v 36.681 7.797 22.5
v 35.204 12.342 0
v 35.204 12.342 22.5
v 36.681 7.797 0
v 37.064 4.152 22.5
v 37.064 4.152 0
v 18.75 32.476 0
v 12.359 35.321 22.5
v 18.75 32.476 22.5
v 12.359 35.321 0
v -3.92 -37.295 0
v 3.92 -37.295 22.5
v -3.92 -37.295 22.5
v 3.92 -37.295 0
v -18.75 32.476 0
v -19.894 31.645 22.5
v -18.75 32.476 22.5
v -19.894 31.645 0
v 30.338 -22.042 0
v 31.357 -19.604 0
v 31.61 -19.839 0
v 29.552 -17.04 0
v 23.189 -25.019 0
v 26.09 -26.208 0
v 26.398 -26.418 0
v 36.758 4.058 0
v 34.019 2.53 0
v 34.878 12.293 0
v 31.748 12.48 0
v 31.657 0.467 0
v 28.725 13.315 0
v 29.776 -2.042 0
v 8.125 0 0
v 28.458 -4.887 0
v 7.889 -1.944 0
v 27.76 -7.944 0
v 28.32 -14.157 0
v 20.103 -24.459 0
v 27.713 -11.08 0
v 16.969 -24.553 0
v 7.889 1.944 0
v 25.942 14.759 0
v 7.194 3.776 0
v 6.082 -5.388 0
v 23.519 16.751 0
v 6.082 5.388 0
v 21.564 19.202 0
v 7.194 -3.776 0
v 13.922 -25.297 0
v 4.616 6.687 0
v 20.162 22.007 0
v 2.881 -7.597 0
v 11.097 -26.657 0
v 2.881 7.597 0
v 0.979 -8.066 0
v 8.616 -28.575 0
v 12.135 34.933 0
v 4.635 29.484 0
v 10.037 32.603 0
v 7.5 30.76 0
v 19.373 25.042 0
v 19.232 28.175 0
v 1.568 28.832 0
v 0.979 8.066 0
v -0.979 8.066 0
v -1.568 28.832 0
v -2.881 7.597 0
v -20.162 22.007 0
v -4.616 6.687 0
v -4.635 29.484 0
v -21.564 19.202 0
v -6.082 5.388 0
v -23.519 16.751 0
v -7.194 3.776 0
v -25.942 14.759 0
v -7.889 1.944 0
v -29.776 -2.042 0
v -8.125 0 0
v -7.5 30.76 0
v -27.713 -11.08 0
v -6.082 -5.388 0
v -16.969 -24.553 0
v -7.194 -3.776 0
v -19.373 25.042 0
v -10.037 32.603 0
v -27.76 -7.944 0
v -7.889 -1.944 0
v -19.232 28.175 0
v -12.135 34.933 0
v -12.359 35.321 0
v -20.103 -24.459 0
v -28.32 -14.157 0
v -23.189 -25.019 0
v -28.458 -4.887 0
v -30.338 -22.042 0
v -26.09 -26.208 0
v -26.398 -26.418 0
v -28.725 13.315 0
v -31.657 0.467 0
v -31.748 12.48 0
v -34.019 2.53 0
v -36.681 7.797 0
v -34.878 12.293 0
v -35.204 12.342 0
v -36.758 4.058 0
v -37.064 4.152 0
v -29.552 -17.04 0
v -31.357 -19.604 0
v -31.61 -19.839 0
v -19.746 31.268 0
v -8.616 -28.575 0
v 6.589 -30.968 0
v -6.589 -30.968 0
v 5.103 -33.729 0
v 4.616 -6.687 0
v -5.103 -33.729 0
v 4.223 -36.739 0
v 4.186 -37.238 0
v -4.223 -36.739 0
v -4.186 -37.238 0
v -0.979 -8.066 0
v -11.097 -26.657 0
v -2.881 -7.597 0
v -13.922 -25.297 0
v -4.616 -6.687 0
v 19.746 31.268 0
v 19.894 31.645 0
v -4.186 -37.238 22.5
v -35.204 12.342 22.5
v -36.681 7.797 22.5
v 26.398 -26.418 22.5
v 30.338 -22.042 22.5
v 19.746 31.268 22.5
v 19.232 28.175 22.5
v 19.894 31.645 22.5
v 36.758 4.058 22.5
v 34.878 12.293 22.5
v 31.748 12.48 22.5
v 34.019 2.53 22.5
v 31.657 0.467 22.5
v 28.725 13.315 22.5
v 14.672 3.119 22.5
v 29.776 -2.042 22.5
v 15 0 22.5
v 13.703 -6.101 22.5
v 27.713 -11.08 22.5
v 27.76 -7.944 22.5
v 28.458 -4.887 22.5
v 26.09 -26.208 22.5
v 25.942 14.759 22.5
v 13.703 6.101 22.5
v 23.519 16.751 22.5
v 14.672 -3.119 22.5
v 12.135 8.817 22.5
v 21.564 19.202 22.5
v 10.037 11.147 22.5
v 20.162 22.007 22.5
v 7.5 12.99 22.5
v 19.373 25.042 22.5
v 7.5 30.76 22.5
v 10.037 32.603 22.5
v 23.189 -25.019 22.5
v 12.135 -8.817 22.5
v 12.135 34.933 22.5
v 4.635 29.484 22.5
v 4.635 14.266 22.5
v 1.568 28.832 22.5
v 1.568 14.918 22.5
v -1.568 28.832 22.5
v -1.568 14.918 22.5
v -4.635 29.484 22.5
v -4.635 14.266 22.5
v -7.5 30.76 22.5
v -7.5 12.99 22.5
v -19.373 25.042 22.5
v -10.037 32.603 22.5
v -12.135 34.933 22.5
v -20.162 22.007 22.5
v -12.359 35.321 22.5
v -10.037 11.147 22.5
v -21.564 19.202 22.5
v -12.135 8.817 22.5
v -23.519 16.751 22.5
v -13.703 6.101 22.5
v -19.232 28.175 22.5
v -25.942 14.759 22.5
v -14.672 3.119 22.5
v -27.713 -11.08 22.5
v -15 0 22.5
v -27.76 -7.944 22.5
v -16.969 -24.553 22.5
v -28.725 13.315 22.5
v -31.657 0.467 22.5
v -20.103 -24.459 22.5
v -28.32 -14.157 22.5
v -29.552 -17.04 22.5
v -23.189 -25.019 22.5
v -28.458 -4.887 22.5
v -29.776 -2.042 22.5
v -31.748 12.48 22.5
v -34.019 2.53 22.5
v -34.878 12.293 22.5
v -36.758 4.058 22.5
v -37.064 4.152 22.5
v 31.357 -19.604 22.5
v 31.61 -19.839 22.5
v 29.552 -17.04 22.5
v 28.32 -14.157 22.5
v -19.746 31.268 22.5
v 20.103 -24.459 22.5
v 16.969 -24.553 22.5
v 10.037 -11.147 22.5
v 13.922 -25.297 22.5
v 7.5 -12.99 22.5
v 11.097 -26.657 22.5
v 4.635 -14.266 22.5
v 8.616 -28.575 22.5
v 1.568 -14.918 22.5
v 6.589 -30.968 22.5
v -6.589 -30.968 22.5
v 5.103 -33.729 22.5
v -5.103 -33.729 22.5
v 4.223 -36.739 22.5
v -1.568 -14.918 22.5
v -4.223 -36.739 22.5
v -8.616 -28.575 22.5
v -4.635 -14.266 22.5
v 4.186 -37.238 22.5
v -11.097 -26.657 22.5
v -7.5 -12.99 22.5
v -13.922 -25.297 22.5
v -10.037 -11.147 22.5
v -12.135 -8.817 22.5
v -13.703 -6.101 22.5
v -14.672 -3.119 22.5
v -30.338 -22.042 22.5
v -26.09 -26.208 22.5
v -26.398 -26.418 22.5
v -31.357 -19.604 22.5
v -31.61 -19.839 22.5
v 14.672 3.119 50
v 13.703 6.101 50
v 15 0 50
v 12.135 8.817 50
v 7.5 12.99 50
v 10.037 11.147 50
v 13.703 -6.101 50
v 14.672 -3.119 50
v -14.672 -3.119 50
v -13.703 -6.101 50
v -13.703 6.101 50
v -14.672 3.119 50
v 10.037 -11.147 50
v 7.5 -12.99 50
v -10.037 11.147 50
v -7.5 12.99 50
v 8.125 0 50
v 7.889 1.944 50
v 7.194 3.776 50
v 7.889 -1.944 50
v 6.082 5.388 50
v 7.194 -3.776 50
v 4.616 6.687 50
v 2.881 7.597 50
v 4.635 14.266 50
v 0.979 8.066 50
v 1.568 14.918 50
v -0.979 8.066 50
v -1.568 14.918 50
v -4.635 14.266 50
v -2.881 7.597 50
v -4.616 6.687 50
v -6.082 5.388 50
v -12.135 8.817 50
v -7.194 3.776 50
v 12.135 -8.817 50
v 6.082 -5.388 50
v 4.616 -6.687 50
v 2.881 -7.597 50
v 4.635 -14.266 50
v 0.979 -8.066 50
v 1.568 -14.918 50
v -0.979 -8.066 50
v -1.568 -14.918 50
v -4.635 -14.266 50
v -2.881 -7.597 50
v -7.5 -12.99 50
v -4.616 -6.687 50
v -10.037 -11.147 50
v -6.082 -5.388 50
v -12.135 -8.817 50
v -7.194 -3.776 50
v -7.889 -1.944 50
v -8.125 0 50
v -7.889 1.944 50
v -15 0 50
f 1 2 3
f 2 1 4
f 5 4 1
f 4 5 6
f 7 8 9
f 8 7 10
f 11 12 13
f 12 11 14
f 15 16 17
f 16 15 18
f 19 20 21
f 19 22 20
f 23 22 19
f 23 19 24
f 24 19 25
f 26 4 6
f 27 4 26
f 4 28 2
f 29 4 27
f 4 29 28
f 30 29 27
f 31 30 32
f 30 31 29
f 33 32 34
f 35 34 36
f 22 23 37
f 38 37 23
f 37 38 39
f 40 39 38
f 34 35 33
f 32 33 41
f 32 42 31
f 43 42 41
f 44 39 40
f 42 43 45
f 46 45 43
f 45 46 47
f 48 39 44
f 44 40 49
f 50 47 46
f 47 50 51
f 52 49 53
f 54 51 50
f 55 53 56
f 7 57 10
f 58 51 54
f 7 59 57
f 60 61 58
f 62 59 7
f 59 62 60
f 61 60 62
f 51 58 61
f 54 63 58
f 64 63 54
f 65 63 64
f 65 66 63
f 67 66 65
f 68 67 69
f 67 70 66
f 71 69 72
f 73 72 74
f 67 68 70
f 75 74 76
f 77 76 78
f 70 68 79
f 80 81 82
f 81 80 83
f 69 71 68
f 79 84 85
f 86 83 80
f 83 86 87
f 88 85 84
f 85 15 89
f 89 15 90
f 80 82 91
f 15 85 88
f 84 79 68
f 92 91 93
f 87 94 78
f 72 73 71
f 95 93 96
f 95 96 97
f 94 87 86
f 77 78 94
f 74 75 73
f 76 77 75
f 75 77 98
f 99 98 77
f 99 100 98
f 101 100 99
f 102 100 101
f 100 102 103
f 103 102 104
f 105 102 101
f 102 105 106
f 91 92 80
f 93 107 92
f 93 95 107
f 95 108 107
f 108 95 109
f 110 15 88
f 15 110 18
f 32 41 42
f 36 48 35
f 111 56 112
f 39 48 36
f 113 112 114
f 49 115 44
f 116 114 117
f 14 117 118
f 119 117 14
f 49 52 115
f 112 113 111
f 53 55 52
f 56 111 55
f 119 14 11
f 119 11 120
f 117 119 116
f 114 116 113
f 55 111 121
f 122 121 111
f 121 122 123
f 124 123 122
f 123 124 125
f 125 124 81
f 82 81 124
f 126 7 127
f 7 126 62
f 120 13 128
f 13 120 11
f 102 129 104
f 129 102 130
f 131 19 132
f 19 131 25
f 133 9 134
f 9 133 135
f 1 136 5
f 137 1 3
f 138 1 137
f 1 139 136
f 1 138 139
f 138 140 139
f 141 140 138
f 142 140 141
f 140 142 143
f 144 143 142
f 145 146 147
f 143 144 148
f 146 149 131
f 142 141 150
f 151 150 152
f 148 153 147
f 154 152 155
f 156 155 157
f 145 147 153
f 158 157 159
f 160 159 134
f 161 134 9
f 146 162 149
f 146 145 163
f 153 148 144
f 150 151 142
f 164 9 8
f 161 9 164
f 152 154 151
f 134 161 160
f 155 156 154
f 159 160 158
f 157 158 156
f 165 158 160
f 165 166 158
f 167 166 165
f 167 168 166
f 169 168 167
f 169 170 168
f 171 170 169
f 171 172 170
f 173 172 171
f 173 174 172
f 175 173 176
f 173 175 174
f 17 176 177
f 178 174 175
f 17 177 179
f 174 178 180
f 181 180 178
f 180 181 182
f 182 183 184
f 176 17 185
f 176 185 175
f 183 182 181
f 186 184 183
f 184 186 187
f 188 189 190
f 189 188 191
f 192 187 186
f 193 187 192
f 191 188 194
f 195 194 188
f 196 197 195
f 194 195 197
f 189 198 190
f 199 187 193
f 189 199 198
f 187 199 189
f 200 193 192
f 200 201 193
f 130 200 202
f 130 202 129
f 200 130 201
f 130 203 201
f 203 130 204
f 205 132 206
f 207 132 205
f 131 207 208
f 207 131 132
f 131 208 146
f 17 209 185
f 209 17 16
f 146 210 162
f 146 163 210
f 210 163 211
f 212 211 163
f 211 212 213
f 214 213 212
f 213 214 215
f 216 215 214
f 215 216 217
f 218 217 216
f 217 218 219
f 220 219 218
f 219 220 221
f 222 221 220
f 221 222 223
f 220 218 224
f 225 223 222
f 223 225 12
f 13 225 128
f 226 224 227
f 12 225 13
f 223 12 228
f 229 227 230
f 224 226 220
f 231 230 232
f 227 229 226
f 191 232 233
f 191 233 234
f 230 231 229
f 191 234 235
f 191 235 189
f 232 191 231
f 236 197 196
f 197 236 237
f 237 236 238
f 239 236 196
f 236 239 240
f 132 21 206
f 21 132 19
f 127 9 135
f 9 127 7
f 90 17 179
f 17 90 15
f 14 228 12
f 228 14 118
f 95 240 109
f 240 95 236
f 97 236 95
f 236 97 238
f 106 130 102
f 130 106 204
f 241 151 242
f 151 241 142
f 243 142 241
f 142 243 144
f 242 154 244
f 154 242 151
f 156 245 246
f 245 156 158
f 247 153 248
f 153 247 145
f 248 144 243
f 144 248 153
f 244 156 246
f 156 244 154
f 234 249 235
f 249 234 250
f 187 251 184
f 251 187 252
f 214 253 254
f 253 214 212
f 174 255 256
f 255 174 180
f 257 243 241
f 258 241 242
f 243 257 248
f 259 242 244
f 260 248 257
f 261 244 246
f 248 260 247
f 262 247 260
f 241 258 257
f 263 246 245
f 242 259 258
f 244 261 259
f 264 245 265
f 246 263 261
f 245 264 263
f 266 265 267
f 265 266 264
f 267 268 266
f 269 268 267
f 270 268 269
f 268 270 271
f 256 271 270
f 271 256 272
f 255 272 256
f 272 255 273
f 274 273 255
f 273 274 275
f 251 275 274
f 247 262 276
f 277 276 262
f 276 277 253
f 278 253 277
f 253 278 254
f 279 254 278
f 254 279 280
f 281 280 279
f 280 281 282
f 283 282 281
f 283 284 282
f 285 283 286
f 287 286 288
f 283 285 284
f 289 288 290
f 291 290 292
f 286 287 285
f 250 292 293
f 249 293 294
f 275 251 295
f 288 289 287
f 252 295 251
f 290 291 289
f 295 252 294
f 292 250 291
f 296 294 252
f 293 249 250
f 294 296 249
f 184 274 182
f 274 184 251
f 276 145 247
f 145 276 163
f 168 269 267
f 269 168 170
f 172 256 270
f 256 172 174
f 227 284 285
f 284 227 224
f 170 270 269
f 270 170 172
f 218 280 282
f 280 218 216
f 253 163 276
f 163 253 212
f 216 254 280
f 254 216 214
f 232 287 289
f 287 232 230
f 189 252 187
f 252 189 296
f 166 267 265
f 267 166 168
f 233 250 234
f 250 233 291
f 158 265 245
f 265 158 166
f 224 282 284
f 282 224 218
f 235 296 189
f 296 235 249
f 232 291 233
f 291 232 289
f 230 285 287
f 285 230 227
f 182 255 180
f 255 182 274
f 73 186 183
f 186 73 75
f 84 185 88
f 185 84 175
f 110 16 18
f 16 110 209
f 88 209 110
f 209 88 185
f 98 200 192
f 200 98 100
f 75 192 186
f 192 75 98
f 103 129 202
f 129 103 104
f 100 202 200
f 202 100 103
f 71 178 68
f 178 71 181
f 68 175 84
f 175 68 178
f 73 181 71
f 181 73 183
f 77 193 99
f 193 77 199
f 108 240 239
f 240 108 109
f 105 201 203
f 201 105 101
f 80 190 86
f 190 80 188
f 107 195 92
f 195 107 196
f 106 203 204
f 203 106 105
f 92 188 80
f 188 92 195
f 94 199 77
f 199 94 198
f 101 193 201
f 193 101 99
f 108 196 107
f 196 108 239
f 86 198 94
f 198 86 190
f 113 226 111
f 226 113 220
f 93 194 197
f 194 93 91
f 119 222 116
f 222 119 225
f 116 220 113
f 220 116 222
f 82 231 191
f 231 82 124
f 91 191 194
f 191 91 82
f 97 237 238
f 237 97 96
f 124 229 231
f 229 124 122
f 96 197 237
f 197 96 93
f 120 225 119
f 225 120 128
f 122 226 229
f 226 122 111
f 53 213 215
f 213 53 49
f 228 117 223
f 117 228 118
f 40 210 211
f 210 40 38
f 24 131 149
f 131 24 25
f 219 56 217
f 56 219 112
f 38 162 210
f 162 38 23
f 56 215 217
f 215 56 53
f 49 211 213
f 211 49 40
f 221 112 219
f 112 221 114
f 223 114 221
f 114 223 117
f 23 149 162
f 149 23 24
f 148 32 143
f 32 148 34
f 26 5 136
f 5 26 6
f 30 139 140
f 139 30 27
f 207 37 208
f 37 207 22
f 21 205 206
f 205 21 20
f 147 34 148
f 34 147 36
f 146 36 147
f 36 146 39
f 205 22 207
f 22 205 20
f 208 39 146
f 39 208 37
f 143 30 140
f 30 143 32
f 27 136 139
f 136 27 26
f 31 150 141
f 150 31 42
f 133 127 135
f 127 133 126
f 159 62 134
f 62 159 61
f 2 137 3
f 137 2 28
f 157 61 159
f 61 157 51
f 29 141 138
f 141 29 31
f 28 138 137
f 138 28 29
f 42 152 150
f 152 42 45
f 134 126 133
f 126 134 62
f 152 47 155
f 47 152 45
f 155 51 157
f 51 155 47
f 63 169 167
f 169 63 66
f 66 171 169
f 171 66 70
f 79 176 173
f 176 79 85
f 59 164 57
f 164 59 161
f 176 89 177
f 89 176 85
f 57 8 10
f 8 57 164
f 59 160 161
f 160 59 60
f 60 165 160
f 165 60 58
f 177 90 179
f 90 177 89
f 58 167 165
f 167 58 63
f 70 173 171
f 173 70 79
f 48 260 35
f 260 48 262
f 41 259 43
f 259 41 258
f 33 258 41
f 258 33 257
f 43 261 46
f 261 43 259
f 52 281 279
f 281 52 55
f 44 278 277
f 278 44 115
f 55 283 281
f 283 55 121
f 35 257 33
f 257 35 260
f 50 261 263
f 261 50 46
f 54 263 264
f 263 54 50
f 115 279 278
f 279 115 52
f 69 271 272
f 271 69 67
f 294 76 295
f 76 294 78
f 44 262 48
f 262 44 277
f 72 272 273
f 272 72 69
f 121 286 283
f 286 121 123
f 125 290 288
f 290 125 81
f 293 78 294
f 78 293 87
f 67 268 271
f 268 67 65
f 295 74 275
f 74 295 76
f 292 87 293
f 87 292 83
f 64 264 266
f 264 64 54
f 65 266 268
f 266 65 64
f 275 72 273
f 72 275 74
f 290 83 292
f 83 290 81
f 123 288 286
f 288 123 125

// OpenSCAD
difference() {
    union() {
        cylinder(r=30*1.25,h=18*1.25);
        cylinder(r=12*1.25,h=40*1.25);
    }
    cylinder(r=6.5*1.25,h=40*1.25);
    a=7;
    for(i=[1:a]) {
        rotate([0,0,360/a*i])translate([0,35*1.25])cylinder(r=12*1.25,h=18*1.25);
    }
}
